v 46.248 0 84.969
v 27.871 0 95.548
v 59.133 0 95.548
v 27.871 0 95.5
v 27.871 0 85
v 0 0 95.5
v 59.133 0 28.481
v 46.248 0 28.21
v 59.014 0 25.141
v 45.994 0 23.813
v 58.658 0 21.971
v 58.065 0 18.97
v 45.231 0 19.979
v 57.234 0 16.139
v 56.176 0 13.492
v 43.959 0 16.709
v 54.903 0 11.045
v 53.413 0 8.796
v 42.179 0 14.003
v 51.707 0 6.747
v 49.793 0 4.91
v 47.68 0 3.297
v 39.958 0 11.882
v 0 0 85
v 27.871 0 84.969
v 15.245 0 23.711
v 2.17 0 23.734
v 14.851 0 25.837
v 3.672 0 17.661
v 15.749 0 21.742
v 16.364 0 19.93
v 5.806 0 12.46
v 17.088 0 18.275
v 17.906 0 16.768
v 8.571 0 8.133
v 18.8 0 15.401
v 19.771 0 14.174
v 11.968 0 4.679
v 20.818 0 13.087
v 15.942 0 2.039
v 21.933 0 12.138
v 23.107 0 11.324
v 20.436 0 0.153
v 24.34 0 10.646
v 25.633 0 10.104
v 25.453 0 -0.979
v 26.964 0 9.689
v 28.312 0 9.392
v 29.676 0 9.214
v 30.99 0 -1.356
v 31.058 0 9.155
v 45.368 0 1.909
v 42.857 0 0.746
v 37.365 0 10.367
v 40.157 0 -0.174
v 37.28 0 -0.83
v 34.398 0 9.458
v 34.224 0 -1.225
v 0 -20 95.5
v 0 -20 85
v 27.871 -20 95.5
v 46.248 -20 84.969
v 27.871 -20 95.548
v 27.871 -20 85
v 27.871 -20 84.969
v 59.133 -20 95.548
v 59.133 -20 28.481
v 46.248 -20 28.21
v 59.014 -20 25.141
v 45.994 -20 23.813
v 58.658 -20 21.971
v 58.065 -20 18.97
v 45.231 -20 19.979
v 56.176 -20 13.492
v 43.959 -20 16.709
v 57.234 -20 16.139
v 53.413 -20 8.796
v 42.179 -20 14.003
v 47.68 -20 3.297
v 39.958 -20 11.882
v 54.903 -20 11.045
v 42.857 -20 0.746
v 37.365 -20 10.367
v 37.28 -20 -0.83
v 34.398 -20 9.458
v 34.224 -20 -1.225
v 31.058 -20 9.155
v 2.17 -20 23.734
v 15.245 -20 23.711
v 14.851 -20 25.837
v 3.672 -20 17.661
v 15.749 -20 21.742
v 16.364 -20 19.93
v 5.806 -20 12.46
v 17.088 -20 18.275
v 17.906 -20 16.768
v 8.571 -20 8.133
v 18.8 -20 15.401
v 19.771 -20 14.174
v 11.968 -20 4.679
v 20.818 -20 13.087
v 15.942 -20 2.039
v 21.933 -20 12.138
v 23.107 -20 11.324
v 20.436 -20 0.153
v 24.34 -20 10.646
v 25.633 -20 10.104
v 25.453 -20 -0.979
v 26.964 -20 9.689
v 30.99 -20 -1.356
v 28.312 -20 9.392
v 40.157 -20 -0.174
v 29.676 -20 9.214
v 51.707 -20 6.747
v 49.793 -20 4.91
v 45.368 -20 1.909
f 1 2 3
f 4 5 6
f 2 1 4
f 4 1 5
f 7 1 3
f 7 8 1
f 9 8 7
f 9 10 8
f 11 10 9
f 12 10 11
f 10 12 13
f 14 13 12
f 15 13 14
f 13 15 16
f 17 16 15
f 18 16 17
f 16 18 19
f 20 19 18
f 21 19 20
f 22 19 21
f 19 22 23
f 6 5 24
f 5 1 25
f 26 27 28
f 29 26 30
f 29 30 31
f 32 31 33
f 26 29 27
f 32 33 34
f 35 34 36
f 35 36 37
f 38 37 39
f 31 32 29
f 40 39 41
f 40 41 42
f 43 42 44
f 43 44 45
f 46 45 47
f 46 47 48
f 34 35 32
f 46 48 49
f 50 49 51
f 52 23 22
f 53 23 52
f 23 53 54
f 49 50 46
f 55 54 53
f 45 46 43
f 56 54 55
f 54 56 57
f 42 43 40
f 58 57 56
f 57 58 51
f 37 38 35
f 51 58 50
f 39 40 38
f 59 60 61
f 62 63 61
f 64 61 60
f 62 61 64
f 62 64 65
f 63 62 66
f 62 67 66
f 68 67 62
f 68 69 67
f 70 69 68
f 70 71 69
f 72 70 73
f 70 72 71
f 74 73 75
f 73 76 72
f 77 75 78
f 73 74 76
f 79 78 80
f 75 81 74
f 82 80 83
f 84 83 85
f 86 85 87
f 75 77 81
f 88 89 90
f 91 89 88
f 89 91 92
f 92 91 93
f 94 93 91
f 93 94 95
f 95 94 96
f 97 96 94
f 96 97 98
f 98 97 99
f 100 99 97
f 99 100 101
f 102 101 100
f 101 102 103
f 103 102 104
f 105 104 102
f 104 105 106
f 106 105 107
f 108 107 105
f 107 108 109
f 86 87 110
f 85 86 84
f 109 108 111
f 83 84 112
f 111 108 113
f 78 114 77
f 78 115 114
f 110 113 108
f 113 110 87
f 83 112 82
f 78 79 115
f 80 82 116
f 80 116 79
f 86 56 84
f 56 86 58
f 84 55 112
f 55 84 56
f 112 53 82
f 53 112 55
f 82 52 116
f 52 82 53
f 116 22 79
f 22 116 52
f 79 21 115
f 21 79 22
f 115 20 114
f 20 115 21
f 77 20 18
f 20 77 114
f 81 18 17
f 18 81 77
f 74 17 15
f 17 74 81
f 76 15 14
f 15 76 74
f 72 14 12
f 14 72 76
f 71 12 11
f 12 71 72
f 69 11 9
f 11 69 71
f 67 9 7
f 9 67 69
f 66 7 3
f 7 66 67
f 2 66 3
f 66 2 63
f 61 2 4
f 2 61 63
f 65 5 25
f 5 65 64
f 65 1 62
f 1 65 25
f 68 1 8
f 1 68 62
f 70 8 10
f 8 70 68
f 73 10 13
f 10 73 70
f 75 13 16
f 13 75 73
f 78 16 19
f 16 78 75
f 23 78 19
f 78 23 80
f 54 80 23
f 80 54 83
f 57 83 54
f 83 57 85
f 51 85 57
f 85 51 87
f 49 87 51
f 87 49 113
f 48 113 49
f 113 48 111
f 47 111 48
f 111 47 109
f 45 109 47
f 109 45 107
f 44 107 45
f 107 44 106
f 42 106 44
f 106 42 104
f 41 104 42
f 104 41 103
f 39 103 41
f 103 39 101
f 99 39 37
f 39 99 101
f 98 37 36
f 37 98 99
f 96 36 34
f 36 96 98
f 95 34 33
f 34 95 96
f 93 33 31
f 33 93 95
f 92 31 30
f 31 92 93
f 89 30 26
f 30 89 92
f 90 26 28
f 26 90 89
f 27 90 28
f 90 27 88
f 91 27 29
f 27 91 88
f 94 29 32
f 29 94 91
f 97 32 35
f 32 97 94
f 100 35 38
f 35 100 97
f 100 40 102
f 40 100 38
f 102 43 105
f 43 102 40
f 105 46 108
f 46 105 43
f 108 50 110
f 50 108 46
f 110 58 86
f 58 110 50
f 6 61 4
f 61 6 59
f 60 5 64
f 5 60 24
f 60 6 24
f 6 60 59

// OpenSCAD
module j(size, thickness) {
    rotate([90, 0, 0]) {
        linear_extrude(height=thickness) {
            text(text="J", size=size);
        }
    }
    translate([0, -thickness, size * 0.85]) { //An extra piece at the top to emphasize the support.
        cube([size / 2, thickness, size * 0.105]);
    }
}

j(100, 20);
